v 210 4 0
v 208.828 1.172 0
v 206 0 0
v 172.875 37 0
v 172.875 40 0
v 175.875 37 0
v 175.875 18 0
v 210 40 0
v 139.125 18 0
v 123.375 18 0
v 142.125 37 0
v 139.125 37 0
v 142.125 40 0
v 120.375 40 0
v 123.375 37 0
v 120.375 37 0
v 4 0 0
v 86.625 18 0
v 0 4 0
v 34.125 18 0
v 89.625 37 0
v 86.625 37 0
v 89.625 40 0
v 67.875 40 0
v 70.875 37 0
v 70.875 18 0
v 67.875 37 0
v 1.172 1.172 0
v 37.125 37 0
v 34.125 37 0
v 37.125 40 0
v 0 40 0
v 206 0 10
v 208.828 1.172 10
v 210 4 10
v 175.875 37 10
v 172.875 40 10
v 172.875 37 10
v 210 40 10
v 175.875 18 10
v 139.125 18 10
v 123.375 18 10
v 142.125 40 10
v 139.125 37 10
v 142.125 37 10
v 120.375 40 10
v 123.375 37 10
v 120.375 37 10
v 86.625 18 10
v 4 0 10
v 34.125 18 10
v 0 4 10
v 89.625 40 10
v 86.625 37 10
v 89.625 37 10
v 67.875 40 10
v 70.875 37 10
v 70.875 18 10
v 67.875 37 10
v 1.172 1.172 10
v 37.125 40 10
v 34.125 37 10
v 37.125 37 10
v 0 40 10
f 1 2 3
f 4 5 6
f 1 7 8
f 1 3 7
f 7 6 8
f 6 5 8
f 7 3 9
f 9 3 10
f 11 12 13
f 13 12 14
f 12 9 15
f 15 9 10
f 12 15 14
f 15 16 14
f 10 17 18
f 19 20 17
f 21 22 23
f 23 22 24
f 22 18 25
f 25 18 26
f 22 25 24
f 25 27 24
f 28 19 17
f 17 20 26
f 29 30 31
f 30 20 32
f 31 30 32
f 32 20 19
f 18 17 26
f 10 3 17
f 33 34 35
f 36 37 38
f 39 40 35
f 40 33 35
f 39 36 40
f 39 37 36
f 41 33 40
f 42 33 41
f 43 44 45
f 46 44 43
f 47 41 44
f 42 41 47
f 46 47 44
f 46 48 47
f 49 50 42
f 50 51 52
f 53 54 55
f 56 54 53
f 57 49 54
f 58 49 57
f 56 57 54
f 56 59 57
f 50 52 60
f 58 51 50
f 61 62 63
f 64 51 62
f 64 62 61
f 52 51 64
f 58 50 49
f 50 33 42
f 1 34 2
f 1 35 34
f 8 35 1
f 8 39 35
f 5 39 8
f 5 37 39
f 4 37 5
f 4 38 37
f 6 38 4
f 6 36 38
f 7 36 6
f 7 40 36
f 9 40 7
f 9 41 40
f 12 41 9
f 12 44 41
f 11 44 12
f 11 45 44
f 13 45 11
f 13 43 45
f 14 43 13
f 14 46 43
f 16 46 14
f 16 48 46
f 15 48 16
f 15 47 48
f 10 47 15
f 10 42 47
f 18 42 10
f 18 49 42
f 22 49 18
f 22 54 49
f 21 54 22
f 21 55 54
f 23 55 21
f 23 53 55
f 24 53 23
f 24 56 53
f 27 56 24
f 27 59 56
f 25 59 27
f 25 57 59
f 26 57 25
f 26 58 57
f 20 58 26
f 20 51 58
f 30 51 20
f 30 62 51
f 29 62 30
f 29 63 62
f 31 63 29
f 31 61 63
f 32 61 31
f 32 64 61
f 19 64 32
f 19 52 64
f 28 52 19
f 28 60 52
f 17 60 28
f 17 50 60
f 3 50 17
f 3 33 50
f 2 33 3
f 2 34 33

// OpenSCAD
$fn = 32;

// ----------------------------------------------------------------------
// Oversize slot bar: 210 mm bar with 3 oversize windows
// ----------------------------------------------------------------------

// --- parameters (mm) ---
profile_height = 10;      // extrusion height
profile_points = 32;      // points of the closed outline

profile = [[0, 4], [1.172, 1.172], [4, 0], [206, 0], [208.828, 1.172], [210, 4], [210, 40], [172.875, 40], [172.875, 37], [175.875, 37], [175.875, 18], [139.125, 18], [139.125, 37], [142.125, 37], [142.125, 40], [120.375, 40], [120.375, 37], [123.375, 37], [123.375, 18], [86.625, 18], [86.625, 37], [89.625, 37], [89.625, 40], [67.875, 40], [67.875, 37], [70.875, 37], [70.875, 18], [34.125, 18], [34.125, 37], [37.125, 37], [37.125, 40], [0, 40]];  // single closed polygon, 32 points, counter clockwise

// --- the one profile operation ---
linear_extrude(height = profile_height) polygon(points = profile);
